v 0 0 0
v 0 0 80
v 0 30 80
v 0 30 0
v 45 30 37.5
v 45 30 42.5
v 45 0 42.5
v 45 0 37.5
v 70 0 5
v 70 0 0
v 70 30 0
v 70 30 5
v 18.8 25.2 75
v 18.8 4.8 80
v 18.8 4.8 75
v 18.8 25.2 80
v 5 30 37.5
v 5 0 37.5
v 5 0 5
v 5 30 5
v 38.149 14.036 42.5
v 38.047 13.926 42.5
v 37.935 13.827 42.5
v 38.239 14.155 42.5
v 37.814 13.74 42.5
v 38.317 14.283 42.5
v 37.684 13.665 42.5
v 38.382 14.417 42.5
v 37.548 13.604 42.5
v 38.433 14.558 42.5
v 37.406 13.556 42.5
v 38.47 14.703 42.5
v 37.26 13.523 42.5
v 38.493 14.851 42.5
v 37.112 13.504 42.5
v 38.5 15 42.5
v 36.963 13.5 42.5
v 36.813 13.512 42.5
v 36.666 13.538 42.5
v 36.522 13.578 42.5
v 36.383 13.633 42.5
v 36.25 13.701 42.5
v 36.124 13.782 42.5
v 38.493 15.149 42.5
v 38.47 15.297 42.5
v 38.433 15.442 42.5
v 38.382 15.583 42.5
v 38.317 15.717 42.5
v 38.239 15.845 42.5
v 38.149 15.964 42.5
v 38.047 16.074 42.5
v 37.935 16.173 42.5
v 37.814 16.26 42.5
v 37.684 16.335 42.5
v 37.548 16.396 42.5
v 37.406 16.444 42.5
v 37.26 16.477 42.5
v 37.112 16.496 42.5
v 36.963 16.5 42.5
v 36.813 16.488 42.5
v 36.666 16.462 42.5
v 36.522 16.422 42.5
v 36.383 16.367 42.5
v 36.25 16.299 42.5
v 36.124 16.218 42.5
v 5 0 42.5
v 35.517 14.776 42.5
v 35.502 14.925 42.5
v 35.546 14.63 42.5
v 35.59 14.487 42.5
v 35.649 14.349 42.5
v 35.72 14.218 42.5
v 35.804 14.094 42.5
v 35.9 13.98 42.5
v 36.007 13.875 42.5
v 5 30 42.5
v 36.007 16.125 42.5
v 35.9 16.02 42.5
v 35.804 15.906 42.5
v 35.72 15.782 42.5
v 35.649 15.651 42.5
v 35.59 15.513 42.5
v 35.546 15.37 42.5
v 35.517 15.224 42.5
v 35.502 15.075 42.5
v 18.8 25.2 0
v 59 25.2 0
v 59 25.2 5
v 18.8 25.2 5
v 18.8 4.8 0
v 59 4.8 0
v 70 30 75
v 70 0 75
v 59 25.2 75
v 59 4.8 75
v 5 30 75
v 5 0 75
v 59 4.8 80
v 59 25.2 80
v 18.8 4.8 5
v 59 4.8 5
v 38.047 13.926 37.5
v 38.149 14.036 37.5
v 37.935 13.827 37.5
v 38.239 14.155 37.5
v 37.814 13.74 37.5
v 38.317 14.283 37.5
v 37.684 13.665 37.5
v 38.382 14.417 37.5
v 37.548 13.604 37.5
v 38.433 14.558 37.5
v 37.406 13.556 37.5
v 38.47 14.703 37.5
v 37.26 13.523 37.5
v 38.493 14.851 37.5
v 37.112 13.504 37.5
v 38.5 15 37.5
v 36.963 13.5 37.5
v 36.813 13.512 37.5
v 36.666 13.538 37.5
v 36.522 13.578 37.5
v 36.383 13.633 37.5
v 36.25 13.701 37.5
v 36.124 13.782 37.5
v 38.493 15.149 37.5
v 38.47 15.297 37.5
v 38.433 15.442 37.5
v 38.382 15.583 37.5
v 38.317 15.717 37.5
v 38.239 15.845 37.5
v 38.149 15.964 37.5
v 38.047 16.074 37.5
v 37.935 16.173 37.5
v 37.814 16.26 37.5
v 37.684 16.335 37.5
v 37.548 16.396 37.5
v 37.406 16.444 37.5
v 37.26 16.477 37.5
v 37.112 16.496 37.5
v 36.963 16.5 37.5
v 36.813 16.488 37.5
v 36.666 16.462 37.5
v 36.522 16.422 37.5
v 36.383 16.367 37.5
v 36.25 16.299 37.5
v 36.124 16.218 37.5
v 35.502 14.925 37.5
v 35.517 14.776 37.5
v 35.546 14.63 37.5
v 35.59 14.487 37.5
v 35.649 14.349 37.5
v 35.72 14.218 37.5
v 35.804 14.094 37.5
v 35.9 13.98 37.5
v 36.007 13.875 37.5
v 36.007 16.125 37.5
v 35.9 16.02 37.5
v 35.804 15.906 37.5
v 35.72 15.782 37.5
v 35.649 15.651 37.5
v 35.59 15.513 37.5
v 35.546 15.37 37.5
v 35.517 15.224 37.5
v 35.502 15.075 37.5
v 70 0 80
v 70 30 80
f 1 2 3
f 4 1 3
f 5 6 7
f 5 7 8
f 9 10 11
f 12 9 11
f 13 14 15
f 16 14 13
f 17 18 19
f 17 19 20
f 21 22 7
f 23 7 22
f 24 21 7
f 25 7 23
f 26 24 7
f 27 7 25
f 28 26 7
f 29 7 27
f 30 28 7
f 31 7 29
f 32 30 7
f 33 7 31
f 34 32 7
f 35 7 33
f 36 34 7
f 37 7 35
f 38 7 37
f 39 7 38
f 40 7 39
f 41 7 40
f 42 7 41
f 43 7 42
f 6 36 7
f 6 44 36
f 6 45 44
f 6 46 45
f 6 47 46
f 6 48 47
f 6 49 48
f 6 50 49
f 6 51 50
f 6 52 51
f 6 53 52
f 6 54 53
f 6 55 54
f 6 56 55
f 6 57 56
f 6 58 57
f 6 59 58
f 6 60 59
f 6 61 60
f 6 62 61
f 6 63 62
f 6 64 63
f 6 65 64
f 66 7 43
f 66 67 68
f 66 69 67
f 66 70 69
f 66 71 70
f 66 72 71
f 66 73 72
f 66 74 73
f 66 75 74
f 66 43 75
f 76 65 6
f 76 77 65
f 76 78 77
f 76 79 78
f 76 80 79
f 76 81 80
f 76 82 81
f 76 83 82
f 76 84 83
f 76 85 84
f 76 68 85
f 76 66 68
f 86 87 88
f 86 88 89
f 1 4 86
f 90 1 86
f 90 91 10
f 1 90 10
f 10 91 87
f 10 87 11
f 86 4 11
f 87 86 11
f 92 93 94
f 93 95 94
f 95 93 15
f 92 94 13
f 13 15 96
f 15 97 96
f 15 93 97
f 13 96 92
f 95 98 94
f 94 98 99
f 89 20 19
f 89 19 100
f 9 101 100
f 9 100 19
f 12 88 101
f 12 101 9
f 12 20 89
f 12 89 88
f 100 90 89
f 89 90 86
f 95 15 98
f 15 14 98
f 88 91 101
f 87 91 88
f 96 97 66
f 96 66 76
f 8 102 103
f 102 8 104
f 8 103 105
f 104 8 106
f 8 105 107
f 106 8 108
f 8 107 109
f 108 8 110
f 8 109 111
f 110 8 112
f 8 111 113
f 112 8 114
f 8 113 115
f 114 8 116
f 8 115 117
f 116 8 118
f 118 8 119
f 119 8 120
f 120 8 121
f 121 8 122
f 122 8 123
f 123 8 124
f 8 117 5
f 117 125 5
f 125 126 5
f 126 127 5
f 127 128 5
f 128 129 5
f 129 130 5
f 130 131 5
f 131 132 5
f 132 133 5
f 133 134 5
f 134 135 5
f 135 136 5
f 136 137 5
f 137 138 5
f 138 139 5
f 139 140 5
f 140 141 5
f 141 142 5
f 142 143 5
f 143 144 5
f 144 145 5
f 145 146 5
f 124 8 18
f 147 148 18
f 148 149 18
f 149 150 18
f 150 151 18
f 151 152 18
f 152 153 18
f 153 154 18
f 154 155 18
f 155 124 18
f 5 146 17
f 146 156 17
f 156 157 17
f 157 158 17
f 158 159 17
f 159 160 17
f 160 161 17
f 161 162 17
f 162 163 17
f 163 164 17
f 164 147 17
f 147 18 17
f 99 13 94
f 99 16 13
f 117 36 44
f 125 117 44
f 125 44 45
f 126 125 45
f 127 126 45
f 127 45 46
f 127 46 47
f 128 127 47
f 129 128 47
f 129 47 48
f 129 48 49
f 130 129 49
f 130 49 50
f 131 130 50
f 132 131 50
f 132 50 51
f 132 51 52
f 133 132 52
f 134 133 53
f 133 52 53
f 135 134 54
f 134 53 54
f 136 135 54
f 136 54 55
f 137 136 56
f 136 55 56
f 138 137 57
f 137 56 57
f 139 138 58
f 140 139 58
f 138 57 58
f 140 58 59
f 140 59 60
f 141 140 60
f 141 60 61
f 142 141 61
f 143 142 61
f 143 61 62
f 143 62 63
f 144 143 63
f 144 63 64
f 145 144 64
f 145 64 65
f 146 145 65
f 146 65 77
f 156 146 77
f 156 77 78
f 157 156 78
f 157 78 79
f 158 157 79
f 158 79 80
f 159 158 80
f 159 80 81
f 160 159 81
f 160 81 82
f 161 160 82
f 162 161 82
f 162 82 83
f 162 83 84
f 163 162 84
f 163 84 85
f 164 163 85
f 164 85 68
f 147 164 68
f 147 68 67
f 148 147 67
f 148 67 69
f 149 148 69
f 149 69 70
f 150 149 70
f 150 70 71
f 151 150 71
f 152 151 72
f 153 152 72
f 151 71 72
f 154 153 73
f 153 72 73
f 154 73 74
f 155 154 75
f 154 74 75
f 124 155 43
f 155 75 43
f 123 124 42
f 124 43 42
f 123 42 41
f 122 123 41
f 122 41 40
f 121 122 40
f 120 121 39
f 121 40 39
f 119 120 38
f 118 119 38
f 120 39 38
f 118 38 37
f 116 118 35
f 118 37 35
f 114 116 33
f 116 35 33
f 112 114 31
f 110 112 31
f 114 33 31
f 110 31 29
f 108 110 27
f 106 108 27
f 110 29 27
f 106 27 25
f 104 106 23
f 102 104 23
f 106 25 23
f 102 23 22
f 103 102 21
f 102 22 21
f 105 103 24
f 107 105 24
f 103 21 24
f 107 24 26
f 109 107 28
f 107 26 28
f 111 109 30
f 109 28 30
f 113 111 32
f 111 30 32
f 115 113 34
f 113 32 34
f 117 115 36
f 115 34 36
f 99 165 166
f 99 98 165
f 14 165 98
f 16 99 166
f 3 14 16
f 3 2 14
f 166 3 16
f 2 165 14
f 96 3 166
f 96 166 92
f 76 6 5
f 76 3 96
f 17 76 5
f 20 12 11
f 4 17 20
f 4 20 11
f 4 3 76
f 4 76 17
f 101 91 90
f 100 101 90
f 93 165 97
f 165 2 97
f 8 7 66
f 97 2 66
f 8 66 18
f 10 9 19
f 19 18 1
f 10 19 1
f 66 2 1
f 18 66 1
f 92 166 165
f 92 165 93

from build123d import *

# Parameters (mm, degrees)
SKETCH_1_W          = 70
SKETCH_1_H          = 30
EXTRUDE_1_DEPTH     = 5
SKETCH_2_W          = 5
SKETCH_2_H          = 30
EXTRUDE_2_DEPTH     = 75
SKETCH_3_W          = 5
SKETCH_3_H          = 30
EXTRUDE_3_DEPTH     = 65
SKETCH_4_W          = 5
SKETCH_4_H          = 30
EXTRUDE_4_DEPTH     = 40
CUT_EXTRUDE_3_REACH = 112.454
SKETCH_6_W          = 40.2
SKETCH_6_H          = 20.4
CUT_EXTRUDE_4_REACH = 112.454
SKETCH_7_W          = 40.2
SKETCH_7_H          = 20.4
CUT_EXTRUDE_5_REACH = 89.214
SKETCH_5_R          = 1.5


with BuildPart() as part:
    # 草图1 → 凸台-拉伸1 (new body)
    with BuildSketch(Plane.XY):
        with Locations((35, 15)):
            Rectangle(SKETCH_1_W, SKETCH_1_H)
    extrude(amount=EXTRUDE_1_DEPTH)

    # 草图2 → 凸台-拉伸2 (add)
    with BuildSketch(Plane.XY.offset(5)):
        with Locations((2.5, 15)):
            Rectangle(SKETCH_2_W, SKETCH_2_H)
    extrude(amount=EXTRUDE_2_DEPTH)

    # 草图3 → 凸台-拉伸3 (add)
    with BuildSketch(Plane(origin=(5, 0, 0), x_dir=(0, 0, -1), z_dir=(1, 0, 0))):
        with Locations((-77.5, 15)):
            Rectangle(SKETCH_3_W, SKETCH_3_H)
    extrude(amount=EXTRUDE_3_DEPTH)

    # 草图4 → 凸台-拉伸4 (add)
    with BuildSketch(Plane(origin=(5, 0, 0), x_dir=(0, 0, -1), z_dir=(1, 0, 0))):
        with Locations((-40, 15)):
            Rectangle(SKETCH_4_W, SKETCH_4_H)
    extrude(amount=EXTRUDE_4_DEPTH)

    # 草图6 → 切除-拉伸3 (cut, up to next)
    with BuildSketch(Plane(origin=(0, 0, 0), x_dir=(-1, 0, 0), z_dir=(0, 0, -1)), mode=Mode.PRIVATE) as cut_extrude_3_sk1:
        with Locations((-38.9, 15)):
            Rectangle(SKETCH_6_W, SKETCH_6_H)
    cut_extrude_3_tool1 = extrude(cut_extrude_3_sk1.sketch, amount=-CUT_EXTRUDE_3_REACH, mode=Mode.PRIVATE) & part.part
    add(cut_extrude_3_tool1.solids().sort_by_distance((38.9, 15, 0))[0], mode=Mode.SUBTRACT)

    # 草图7 → 切除-拉伸4 (cut, up to next)
    with BuildSketch(Plane.XY.offset(80), mode=Mode.PRIVATE) as cut_extrude_4_sk1:
        with Locations((38.9, 15)):
            Rectangle(SKETCH_7_W, SKETCH_7_H)
    cut_extrude_4_tool1 = extrude(cut_extrude_4_sk1.sketch, amount=-CUT_EXTRUDE_4_REACH, mode=Mode.PRIVATE) & part.part
    add(cut_extrude_4_tool1.solids().sort_by_distance((38.9, 15, 80))[0], mode=Mode.SUBTRACT)

    # 草图5 → 切除-拉伸5 (cut, up to next)
    with BuildSketch(Plane.XY.offset(42.5), mode=Mode.PRIVATE) as cut_extrude_5_sk1:
        with Locations((37, 15)):
            Circle(SKETCH_5_R)
    cut_extrude_5_tool1 = extrude(cut_extrude_5_sk1.sketch, amount=-CUT_EXTRUDE_5_REACH, mode=Mode.PRIVATE) & part.part
    add(cut_extrude_5_tool1.solids().sort_by_distance((37, 15, 42.5))[0], mode=Mode.SUBTRACT)


solid = part.part
